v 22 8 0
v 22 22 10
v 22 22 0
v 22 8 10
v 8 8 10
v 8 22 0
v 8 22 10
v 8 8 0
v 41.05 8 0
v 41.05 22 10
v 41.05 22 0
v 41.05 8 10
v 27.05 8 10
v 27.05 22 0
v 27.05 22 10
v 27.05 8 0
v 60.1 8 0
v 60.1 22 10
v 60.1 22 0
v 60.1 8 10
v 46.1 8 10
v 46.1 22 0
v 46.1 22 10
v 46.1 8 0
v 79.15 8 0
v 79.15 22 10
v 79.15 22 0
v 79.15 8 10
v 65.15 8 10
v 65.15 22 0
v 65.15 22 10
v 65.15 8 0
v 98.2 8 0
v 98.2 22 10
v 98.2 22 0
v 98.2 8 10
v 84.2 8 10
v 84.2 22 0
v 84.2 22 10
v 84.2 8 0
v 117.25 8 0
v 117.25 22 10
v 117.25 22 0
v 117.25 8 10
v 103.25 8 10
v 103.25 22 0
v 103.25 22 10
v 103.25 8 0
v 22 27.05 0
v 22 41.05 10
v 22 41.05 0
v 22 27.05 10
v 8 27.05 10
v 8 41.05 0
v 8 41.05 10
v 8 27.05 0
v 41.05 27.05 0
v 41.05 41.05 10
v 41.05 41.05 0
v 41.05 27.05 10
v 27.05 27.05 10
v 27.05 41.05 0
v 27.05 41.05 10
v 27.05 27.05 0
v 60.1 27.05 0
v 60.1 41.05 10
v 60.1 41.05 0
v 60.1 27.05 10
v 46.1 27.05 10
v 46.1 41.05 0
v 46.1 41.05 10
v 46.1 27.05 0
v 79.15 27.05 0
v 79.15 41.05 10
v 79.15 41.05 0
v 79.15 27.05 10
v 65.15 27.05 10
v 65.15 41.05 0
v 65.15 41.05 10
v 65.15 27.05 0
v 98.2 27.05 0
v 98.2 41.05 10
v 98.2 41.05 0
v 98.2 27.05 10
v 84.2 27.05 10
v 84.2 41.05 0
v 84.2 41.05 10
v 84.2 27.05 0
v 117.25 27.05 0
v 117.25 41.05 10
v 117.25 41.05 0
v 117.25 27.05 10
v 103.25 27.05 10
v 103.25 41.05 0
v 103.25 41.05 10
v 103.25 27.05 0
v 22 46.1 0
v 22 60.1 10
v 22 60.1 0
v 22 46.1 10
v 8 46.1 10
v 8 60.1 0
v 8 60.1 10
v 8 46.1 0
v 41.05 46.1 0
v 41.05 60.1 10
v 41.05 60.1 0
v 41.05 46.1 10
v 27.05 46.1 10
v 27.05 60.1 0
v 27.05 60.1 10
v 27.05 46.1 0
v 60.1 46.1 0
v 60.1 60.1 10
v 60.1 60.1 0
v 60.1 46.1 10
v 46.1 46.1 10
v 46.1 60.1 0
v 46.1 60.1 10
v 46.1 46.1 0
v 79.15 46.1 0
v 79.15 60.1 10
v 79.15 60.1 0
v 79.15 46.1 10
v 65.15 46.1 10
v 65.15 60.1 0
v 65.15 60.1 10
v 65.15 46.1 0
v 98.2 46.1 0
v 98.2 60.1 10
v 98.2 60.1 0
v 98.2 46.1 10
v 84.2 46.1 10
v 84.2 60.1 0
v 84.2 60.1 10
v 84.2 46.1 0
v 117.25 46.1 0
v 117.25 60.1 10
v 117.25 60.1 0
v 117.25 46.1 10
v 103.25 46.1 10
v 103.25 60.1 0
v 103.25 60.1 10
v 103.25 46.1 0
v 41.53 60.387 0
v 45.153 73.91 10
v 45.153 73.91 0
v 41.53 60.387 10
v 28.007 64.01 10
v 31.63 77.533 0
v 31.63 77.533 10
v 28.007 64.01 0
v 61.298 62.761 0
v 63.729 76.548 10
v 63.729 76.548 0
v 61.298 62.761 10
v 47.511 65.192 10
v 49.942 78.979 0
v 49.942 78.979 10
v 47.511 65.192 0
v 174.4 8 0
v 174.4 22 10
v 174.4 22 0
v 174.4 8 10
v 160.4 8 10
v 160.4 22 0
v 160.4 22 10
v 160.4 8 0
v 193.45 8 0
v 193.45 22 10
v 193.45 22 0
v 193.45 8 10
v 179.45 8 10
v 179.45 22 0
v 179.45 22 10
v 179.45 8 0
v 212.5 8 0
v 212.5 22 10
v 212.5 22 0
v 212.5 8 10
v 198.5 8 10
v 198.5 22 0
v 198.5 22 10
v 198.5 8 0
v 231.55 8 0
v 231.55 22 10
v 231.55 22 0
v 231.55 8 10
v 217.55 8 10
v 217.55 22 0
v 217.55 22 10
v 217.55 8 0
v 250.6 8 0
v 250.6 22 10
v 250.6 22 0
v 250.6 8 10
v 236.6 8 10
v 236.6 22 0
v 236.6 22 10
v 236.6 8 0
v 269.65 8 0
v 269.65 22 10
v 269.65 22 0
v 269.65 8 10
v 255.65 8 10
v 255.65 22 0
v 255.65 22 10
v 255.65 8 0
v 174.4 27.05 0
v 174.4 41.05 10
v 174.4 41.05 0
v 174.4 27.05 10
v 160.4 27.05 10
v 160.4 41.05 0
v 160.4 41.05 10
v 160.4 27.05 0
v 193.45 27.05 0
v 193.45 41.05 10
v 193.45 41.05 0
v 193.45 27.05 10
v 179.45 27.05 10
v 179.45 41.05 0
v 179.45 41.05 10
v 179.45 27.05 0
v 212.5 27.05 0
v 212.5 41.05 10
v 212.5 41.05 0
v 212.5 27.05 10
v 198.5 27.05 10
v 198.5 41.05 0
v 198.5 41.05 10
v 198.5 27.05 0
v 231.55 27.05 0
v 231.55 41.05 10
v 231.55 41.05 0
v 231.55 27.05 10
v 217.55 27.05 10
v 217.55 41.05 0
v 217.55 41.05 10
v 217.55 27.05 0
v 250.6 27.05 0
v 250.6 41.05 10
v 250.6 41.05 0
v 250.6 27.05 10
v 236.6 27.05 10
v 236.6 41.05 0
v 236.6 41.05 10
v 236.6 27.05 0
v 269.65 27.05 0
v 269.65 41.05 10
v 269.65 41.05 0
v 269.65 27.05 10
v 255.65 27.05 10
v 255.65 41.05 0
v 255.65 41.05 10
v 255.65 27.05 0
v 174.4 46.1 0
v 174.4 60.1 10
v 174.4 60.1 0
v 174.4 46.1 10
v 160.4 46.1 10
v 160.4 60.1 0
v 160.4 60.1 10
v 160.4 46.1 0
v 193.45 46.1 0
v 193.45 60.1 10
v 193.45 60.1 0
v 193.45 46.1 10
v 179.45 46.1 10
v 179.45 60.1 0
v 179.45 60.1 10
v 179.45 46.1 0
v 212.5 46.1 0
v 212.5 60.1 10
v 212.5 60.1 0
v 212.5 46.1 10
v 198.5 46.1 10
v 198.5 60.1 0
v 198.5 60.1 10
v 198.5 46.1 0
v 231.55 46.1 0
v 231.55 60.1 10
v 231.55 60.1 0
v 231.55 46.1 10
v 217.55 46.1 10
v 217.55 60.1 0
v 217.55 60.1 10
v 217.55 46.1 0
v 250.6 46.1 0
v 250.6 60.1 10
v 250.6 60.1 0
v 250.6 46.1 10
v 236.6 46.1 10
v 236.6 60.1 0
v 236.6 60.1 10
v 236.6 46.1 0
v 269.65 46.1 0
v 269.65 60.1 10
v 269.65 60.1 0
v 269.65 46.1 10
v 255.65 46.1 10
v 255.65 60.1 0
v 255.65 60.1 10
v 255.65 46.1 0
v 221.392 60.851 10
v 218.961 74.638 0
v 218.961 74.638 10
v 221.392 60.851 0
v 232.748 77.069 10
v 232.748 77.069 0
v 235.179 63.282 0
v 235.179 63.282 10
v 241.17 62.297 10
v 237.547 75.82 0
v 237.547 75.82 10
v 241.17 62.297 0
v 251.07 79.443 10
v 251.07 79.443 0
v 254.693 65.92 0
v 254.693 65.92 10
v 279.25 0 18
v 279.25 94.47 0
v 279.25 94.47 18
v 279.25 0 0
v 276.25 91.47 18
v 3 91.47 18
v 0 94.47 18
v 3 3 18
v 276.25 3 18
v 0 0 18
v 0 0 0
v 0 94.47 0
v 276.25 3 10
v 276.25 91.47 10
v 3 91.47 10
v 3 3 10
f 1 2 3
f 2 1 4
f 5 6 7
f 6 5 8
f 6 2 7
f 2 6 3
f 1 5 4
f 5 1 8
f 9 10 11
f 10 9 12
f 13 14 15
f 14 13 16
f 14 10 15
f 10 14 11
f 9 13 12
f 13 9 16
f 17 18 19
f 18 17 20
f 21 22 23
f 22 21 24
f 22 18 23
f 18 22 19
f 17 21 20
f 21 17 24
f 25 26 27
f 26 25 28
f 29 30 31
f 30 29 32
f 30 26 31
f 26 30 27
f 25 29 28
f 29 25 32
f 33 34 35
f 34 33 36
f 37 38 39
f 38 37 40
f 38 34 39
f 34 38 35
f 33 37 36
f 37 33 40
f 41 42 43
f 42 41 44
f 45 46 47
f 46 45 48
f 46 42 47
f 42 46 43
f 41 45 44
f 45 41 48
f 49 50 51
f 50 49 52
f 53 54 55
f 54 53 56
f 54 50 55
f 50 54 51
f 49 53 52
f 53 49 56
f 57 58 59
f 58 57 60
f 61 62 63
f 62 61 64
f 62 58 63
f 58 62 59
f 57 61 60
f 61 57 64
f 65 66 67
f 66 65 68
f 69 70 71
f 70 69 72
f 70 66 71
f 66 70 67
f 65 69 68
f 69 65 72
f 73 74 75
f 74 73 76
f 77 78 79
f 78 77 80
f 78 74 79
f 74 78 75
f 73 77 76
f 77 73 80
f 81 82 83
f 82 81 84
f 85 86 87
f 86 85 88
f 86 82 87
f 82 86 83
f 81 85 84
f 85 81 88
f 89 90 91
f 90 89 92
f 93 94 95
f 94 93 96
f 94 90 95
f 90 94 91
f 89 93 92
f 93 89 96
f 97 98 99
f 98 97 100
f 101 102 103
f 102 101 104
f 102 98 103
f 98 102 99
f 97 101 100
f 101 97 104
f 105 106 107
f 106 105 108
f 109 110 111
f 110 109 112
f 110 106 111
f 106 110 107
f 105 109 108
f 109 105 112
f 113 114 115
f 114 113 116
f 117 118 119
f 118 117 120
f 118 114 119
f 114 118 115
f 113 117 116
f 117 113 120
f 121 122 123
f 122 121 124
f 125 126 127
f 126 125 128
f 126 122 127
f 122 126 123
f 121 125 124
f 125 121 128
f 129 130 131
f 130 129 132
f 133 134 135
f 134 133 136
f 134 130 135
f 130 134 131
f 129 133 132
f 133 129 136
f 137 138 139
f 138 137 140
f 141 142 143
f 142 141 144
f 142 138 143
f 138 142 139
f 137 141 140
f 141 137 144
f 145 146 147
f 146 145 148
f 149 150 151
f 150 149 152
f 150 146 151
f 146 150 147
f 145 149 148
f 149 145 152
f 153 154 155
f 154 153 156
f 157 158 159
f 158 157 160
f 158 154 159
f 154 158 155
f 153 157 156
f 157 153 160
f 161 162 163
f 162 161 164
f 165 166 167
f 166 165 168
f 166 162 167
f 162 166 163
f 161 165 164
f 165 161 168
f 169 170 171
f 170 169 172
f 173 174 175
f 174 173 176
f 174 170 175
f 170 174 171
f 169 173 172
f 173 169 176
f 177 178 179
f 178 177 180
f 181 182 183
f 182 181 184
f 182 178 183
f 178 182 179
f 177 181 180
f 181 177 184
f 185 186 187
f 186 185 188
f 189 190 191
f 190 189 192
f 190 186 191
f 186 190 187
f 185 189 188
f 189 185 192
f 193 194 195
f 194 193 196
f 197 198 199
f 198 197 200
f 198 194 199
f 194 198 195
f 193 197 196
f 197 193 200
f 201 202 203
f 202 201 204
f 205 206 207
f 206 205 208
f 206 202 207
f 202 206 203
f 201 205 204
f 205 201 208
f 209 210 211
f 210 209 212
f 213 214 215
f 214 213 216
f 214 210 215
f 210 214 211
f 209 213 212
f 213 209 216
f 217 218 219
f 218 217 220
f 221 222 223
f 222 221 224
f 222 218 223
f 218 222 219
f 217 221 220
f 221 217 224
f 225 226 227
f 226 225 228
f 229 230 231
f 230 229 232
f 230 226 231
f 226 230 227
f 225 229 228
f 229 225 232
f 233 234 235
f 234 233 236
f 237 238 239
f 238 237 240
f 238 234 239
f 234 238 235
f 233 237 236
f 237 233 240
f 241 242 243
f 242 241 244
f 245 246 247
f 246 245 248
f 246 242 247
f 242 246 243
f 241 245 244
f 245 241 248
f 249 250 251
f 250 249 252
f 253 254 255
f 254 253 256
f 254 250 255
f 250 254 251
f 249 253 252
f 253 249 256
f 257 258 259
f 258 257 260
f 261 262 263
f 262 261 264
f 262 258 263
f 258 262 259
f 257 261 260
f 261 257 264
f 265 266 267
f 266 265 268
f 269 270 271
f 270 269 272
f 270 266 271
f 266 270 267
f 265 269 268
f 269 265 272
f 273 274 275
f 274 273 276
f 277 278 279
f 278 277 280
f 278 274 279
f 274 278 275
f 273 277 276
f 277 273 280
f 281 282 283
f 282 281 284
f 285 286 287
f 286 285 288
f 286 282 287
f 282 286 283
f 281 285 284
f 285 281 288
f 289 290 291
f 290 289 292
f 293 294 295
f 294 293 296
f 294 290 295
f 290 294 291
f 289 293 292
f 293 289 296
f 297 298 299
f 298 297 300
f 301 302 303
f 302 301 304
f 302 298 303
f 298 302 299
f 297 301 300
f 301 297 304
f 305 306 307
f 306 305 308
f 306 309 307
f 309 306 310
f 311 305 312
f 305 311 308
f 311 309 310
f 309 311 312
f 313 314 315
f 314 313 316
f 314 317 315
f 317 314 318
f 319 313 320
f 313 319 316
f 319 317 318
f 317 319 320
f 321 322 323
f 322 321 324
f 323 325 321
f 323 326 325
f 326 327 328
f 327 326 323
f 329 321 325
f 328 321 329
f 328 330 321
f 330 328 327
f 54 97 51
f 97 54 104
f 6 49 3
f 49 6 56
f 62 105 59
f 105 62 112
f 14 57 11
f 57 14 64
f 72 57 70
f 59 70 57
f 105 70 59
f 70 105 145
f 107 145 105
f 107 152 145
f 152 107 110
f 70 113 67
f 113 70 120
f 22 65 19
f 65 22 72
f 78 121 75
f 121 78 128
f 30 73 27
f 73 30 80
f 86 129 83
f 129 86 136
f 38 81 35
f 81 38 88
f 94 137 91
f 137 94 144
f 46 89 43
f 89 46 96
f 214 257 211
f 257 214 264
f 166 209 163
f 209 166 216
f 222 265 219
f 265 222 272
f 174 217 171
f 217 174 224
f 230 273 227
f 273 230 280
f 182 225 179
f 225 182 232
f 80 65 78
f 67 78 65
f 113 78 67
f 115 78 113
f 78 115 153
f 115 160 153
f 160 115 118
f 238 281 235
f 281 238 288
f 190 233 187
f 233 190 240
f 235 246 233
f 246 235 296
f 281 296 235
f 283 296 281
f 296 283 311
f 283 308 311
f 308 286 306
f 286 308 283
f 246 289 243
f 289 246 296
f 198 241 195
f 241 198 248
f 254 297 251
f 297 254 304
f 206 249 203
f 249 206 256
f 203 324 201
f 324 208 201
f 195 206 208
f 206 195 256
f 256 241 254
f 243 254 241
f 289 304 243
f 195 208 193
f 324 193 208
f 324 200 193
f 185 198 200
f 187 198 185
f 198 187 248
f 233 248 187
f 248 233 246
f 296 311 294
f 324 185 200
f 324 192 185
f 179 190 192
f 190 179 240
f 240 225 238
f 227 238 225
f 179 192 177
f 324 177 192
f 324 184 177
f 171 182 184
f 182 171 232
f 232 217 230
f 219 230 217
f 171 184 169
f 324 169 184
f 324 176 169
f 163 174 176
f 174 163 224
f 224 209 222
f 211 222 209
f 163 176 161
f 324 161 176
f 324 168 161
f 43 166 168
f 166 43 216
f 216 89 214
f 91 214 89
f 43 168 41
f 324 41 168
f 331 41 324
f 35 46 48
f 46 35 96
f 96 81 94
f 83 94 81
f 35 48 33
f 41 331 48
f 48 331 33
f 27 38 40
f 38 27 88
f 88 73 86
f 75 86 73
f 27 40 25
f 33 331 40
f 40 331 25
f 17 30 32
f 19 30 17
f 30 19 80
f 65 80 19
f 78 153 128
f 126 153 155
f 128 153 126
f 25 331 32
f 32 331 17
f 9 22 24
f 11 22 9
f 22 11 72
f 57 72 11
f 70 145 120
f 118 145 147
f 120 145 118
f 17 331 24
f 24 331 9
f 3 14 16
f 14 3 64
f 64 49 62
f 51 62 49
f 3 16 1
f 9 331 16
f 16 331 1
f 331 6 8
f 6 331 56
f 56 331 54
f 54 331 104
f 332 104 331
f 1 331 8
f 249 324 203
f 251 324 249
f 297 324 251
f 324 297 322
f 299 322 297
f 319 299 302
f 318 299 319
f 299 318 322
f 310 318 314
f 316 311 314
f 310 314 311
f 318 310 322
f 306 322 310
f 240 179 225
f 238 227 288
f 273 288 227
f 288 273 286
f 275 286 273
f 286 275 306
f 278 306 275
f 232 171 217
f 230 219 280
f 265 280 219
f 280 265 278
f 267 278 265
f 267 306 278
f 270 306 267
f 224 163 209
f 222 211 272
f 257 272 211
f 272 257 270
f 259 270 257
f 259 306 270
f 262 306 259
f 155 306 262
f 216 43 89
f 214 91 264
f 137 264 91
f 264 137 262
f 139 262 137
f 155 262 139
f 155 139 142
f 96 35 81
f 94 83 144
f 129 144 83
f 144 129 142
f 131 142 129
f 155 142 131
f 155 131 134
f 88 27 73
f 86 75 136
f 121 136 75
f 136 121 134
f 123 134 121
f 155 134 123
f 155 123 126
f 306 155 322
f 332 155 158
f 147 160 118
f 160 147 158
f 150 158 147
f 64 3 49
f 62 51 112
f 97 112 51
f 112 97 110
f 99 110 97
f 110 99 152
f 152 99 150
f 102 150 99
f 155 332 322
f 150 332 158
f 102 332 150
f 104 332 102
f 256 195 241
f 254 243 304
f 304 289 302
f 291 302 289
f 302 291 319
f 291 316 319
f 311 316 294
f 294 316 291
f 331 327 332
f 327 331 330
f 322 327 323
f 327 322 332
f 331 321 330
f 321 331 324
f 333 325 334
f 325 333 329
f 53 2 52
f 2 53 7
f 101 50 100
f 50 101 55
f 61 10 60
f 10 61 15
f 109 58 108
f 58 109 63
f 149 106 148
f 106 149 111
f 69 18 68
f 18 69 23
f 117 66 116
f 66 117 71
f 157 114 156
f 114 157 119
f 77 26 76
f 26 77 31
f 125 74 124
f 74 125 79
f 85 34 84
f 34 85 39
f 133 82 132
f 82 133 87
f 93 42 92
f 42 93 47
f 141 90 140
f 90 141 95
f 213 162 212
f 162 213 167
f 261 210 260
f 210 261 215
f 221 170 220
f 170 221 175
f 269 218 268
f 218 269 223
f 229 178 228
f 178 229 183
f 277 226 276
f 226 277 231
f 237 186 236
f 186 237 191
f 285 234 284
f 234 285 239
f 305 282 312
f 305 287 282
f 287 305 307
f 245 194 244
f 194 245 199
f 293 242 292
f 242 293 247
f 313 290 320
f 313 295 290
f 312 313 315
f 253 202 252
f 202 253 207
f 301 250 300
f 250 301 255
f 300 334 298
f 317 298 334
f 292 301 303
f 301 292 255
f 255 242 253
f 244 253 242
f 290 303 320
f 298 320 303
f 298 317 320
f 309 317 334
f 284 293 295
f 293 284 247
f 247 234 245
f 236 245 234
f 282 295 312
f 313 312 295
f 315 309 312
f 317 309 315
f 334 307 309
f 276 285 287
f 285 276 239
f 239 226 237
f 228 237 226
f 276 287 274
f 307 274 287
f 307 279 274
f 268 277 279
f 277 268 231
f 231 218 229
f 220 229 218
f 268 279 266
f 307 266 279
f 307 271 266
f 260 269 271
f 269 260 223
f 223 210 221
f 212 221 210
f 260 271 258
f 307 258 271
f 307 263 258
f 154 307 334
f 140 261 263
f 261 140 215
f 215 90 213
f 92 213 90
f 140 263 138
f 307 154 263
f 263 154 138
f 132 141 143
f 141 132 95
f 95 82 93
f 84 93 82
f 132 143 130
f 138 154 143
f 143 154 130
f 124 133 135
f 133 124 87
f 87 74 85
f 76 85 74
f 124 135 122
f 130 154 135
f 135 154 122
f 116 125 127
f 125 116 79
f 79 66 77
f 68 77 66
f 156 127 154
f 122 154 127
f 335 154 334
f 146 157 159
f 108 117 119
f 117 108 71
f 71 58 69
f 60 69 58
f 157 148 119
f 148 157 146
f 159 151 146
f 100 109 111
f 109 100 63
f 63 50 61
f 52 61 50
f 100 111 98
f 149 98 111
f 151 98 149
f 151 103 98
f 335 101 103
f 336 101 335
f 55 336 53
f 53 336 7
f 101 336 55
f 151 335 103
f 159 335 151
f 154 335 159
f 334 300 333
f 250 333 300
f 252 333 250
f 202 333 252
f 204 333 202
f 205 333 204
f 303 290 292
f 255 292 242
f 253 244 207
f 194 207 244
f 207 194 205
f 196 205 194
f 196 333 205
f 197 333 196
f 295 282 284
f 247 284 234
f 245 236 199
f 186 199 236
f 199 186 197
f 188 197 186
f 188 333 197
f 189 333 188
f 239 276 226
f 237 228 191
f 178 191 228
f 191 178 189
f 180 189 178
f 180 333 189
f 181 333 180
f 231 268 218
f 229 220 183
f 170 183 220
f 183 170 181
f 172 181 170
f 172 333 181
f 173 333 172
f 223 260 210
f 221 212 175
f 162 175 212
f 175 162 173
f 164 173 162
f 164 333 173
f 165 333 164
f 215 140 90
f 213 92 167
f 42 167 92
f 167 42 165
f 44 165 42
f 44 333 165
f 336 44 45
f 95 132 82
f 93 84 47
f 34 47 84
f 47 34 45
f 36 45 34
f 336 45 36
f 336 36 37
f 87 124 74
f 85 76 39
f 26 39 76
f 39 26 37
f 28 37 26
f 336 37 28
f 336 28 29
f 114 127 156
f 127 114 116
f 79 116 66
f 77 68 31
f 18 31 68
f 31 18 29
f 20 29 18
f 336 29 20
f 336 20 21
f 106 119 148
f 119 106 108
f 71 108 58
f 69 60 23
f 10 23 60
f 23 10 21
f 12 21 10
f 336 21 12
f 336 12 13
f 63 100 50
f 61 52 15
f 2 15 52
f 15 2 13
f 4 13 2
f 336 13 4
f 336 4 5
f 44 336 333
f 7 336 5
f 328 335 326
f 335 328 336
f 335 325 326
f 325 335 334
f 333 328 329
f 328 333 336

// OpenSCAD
// Generated keyboard case
// Layout: Custom (40 keys)
// Switch type: Cherry MX

// Parameters
case_width = 279.25;
case_height = 94.47;
case_depth = 18.00;
wall_thickness = 3.00;
base_height = 10.00;
switch_cutout_size = 14.00;
key_spacing = 19.05;

module keyboard_case() {
    difference() {
        // Outer shell
        translate([0, 0, 0])
            cube([case_width, case_height, case_depth]);

        // Inner cavity
        translate([wall_thickness, wall_thickness, base_height])
            cube([case_width - 2*wall_thickness, 
                  case_height - 2*wall_thickness, 
                  case_depth - base_height + 1]);

        // Switch cutouts
        translate([wall_thickness + 5 - 0.00, wall_thickness + 5 - 0.00, -1])
            switch_plate();
    }
}

module switch_plate() {
    translate([0.00, 0.00, 0])
        cube([switch_cutout_size, switch_cutout_size, base_height + 2]);
    translate([19.05, 0.00, 0])
        cube([switch_cutout_size, switch_cutout_size, base_height + 2]);
    translate([38.10, 0.00, 0])
        cube([switch_cutout_size, switch_cutout_size, base_height + 2]);
    translate([57.15, 0.00, 0])
        cube([switch_cutout_size, switch_cutout_size, base_height + 2]);
    translate([76.20, 0.00, 0])
        cube([switch_cutout_size, switch_cutout_size, base_height + 2]);
    translate([95.25, 0.00, 0])
        cube([switch_cutout_size, switch_cutout_size, base_height + 2]);
    translate([0.00, 19.05, 0])
        cube([switch_cutout_size, switch_cutout_size, base_height + 2]);
    translate([19.05, 19.05, 0])
        cube([switch_cutout_size, switch_cutout_size, base_height + 2]);
    translate([38.10, 19.05, 0])
        cube([switch_cutout_size, switch_cutout_size, base_height + 2]);
    translate([57.15, 19.05, 0])
        cube([switch_cutout_size, switch_cutout_size, base_height + 2]);
    translate([76.20, 19.05, 0])
        cube([switch_cutout_size, switch_cutout_size, base_height + 2]);
    translate([95.25, 19.05, 0])
        cube([switch_cutout_size, switch_cutout_size, base_height + 2]);
    translate([0.00, 38.10, 0])
        cube([switch_cutout_size, switch_cutout_size, base_height + 2]);
    translate([19.05, 38.10, 0])
        cube([switch_cutout_size, switch_cutout_size, base_height + 2]);
    translate([38.10, 38.10, 0])
        cube([switch_cutout_size, switch_cutout_size, base_height + 2]);
    translate([57.15, 38.10, 0])
        cube([switch_cutout_size, switch_cutout_size, base_height + 2]);
    translate([76.20, 38.10, 0])
        cube([switch_cutout_size, switch_cutout_size, base_height + 2]);
    translate([95.25, 38.10, 0])
        cube([switch_cutout_size, switch_cutout_size, base_height + 2]);
    translate([28.58, 60.96, 0])
        rotate([0, 0, -15.00])
            translate([-7.00, -7.00, 0])
                cube([switch_cutout_size, switch_cutout_size, base_height + 2]);
    translate([47.62, 62.87, 0])
        rotate([0, 0, -10.00])
            translate([-7.00, -7.00, 0])
                cube([switch_cutout_size, switch_cutout_size, base_height + 2]);
    translate([152.40, 0.00, 0])
        cube([switch_cutout_size, switch_cutout_size, base_height + 2]);
    translate([171.45, 0.00, 0])
        cube([switch_cutout_size, switch_cutout_size, base_height + 2]);
    translate([190.50, 0.00, 0])
        cube([switch_cutout_size, switch_cutout_size, base_height + 2]);
    translate([209.55, 0.00, 0])
        cube([switch_cutout_size, switch_cutout_size, base_height + 2]);
    translate([228.60, 0.00, 0])
        cube([switch_cutout_size, switch_cutout_size, base_height + 2]);
    translate([247.65, 0.00, 0])
        cube([switch_cutout_size, switch_cutout_size, base_height + 2]);
    translate([152.40, 19.05, 0])
        cube([switch_cutout_size, switch_cutout_size, base_height + 2]);
    translate([171.45, 19.05, 0])
        cube([switch_cutout_size, switch_cutout_size, base_height + 2]);
    translate([190.50, 19.05, 0])
        cube([switch_cutout_size, switch_cutout_size, base_height + 2]);
    translate([209.55, 19.05, 0])
        cube([switch_cutout_size, switch_cutout_size, base_height + 2]);
    translate([228.60, 19.05, 0])
        cube([switch_cutout_size, switch_cutout_size, base_height + 2]);
    translate([247.65, 19.05, 0])
        cube([switch_cutout_size, switch_cutout_size, base_height + 2]);
    translate([152.40, 38.10, 0])
        cube([switch_cutout_size, switch_cutout_size, base_height + 2]);
    translate([171.45, 38.10, 0])
        cube([switch_cutout_size, switch_cutout_size, base_height + 2]);
    translate([190.50, 38.10, 0])
        cube([switch_cutout_size, switch_cutout_size, base_height + 2]);
    translate([209.55, 38.10, 0])
        cube([switch_cutout_size, switch_cutout_size, base_height + 2]);
    translate([228.60, 38.10, 0])
        cube([switch_cutout_size, switch_cutout_size, base_height + 2]);
    translate([247.65, 38.10, 0])
        cube([switch_cutout_size, switch_cutout_size, base_height + 2]);
    translate([219.07, 60.96, 0])
        rotate([0, 0, 10.00])
            translate([-7.00, -7.00, 0])
                cube([switch_cutout_size, switch_cutout_size, base_height + 2]);
    translate([238.12, 62.87, 0])
        rotate([0, 0, 15.00])
            translate([-7.00, -7.00, 0])
                cube([switch_cutout_size, switch_cutout_size, base_height + 2]);
}

// Generate the case
keyboard_case();
